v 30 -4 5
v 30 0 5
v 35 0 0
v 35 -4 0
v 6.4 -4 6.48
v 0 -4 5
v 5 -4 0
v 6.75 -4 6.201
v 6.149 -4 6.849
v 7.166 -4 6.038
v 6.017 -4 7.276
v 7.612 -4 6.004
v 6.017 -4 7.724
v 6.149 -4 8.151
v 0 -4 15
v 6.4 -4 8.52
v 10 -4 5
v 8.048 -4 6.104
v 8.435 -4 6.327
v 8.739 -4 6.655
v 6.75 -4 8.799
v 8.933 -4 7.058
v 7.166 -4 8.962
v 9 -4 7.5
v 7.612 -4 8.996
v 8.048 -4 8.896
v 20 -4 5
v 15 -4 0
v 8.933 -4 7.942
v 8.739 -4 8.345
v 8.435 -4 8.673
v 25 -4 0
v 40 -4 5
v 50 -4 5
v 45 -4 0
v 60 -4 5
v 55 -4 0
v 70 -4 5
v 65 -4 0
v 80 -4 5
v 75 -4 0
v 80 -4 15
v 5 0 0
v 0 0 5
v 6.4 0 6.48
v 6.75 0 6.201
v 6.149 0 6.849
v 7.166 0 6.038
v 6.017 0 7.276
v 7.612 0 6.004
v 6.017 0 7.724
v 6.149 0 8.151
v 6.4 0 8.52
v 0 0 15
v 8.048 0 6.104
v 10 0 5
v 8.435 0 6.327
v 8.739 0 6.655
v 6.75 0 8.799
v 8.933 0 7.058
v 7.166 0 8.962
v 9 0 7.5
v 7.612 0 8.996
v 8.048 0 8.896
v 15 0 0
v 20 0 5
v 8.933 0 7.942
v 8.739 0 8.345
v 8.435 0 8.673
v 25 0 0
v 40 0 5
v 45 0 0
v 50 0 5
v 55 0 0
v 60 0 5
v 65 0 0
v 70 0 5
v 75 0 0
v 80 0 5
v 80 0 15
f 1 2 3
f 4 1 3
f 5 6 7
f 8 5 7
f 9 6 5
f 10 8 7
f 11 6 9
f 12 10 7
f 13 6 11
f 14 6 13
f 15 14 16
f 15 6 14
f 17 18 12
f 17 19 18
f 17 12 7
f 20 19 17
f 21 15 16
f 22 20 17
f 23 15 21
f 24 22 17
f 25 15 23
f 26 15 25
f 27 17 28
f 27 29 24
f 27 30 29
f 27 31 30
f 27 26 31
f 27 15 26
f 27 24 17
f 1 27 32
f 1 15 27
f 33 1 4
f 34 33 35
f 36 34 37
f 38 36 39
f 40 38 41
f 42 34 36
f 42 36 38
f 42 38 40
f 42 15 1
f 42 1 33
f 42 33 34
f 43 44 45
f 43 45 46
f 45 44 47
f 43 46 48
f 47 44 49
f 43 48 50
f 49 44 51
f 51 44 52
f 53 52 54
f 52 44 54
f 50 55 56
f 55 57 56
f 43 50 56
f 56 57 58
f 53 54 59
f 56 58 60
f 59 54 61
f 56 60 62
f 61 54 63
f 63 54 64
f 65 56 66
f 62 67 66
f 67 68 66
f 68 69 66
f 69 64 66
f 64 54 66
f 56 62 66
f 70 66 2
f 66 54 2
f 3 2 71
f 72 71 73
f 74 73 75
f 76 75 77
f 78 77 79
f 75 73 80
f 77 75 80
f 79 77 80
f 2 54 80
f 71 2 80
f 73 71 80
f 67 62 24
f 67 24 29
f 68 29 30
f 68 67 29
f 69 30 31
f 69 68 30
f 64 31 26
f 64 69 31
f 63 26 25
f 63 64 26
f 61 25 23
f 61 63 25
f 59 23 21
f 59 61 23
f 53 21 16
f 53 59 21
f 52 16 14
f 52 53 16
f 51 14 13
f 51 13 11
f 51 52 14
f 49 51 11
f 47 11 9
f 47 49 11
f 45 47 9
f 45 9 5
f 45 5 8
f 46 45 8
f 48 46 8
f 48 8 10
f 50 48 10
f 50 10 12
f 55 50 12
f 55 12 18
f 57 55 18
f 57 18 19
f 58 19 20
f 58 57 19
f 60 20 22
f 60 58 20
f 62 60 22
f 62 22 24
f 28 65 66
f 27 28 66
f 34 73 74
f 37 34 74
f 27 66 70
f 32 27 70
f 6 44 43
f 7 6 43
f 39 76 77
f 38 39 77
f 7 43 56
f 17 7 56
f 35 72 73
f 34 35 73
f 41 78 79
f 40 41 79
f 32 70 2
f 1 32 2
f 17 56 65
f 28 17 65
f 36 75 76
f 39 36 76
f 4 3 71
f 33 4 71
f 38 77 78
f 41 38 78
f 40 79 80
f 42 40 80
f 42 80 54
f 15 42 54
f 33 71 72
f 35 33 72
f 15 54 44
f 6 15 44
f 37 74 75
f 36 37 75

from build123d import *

# Parameters (mm, degrees)
F0_R     = 1.5
F1_DEPTH = 4


with BuildPart() as f1:
    # F0 (on Front) → F1 (new body)
    with BuildSketch(Plane.XZ):
        Polygon((80, 15), (0, 15), (0, 5), (5, 0), (10, 5), (15, 0), (20, 5), (25, 0), (30, 5), (35, 0), (40, 5), (45, 0), (50, 5), (55, 0), (60, 5), (65, 0), (70, 5), (75, 0), (80, 5), align=None)
        with Locations((7.5, 7.5)):
            Circle(F0_R, mode=Mode.SUBTRACT)
    extrude(amount=F1_DEPTH)


solid = f1.part
